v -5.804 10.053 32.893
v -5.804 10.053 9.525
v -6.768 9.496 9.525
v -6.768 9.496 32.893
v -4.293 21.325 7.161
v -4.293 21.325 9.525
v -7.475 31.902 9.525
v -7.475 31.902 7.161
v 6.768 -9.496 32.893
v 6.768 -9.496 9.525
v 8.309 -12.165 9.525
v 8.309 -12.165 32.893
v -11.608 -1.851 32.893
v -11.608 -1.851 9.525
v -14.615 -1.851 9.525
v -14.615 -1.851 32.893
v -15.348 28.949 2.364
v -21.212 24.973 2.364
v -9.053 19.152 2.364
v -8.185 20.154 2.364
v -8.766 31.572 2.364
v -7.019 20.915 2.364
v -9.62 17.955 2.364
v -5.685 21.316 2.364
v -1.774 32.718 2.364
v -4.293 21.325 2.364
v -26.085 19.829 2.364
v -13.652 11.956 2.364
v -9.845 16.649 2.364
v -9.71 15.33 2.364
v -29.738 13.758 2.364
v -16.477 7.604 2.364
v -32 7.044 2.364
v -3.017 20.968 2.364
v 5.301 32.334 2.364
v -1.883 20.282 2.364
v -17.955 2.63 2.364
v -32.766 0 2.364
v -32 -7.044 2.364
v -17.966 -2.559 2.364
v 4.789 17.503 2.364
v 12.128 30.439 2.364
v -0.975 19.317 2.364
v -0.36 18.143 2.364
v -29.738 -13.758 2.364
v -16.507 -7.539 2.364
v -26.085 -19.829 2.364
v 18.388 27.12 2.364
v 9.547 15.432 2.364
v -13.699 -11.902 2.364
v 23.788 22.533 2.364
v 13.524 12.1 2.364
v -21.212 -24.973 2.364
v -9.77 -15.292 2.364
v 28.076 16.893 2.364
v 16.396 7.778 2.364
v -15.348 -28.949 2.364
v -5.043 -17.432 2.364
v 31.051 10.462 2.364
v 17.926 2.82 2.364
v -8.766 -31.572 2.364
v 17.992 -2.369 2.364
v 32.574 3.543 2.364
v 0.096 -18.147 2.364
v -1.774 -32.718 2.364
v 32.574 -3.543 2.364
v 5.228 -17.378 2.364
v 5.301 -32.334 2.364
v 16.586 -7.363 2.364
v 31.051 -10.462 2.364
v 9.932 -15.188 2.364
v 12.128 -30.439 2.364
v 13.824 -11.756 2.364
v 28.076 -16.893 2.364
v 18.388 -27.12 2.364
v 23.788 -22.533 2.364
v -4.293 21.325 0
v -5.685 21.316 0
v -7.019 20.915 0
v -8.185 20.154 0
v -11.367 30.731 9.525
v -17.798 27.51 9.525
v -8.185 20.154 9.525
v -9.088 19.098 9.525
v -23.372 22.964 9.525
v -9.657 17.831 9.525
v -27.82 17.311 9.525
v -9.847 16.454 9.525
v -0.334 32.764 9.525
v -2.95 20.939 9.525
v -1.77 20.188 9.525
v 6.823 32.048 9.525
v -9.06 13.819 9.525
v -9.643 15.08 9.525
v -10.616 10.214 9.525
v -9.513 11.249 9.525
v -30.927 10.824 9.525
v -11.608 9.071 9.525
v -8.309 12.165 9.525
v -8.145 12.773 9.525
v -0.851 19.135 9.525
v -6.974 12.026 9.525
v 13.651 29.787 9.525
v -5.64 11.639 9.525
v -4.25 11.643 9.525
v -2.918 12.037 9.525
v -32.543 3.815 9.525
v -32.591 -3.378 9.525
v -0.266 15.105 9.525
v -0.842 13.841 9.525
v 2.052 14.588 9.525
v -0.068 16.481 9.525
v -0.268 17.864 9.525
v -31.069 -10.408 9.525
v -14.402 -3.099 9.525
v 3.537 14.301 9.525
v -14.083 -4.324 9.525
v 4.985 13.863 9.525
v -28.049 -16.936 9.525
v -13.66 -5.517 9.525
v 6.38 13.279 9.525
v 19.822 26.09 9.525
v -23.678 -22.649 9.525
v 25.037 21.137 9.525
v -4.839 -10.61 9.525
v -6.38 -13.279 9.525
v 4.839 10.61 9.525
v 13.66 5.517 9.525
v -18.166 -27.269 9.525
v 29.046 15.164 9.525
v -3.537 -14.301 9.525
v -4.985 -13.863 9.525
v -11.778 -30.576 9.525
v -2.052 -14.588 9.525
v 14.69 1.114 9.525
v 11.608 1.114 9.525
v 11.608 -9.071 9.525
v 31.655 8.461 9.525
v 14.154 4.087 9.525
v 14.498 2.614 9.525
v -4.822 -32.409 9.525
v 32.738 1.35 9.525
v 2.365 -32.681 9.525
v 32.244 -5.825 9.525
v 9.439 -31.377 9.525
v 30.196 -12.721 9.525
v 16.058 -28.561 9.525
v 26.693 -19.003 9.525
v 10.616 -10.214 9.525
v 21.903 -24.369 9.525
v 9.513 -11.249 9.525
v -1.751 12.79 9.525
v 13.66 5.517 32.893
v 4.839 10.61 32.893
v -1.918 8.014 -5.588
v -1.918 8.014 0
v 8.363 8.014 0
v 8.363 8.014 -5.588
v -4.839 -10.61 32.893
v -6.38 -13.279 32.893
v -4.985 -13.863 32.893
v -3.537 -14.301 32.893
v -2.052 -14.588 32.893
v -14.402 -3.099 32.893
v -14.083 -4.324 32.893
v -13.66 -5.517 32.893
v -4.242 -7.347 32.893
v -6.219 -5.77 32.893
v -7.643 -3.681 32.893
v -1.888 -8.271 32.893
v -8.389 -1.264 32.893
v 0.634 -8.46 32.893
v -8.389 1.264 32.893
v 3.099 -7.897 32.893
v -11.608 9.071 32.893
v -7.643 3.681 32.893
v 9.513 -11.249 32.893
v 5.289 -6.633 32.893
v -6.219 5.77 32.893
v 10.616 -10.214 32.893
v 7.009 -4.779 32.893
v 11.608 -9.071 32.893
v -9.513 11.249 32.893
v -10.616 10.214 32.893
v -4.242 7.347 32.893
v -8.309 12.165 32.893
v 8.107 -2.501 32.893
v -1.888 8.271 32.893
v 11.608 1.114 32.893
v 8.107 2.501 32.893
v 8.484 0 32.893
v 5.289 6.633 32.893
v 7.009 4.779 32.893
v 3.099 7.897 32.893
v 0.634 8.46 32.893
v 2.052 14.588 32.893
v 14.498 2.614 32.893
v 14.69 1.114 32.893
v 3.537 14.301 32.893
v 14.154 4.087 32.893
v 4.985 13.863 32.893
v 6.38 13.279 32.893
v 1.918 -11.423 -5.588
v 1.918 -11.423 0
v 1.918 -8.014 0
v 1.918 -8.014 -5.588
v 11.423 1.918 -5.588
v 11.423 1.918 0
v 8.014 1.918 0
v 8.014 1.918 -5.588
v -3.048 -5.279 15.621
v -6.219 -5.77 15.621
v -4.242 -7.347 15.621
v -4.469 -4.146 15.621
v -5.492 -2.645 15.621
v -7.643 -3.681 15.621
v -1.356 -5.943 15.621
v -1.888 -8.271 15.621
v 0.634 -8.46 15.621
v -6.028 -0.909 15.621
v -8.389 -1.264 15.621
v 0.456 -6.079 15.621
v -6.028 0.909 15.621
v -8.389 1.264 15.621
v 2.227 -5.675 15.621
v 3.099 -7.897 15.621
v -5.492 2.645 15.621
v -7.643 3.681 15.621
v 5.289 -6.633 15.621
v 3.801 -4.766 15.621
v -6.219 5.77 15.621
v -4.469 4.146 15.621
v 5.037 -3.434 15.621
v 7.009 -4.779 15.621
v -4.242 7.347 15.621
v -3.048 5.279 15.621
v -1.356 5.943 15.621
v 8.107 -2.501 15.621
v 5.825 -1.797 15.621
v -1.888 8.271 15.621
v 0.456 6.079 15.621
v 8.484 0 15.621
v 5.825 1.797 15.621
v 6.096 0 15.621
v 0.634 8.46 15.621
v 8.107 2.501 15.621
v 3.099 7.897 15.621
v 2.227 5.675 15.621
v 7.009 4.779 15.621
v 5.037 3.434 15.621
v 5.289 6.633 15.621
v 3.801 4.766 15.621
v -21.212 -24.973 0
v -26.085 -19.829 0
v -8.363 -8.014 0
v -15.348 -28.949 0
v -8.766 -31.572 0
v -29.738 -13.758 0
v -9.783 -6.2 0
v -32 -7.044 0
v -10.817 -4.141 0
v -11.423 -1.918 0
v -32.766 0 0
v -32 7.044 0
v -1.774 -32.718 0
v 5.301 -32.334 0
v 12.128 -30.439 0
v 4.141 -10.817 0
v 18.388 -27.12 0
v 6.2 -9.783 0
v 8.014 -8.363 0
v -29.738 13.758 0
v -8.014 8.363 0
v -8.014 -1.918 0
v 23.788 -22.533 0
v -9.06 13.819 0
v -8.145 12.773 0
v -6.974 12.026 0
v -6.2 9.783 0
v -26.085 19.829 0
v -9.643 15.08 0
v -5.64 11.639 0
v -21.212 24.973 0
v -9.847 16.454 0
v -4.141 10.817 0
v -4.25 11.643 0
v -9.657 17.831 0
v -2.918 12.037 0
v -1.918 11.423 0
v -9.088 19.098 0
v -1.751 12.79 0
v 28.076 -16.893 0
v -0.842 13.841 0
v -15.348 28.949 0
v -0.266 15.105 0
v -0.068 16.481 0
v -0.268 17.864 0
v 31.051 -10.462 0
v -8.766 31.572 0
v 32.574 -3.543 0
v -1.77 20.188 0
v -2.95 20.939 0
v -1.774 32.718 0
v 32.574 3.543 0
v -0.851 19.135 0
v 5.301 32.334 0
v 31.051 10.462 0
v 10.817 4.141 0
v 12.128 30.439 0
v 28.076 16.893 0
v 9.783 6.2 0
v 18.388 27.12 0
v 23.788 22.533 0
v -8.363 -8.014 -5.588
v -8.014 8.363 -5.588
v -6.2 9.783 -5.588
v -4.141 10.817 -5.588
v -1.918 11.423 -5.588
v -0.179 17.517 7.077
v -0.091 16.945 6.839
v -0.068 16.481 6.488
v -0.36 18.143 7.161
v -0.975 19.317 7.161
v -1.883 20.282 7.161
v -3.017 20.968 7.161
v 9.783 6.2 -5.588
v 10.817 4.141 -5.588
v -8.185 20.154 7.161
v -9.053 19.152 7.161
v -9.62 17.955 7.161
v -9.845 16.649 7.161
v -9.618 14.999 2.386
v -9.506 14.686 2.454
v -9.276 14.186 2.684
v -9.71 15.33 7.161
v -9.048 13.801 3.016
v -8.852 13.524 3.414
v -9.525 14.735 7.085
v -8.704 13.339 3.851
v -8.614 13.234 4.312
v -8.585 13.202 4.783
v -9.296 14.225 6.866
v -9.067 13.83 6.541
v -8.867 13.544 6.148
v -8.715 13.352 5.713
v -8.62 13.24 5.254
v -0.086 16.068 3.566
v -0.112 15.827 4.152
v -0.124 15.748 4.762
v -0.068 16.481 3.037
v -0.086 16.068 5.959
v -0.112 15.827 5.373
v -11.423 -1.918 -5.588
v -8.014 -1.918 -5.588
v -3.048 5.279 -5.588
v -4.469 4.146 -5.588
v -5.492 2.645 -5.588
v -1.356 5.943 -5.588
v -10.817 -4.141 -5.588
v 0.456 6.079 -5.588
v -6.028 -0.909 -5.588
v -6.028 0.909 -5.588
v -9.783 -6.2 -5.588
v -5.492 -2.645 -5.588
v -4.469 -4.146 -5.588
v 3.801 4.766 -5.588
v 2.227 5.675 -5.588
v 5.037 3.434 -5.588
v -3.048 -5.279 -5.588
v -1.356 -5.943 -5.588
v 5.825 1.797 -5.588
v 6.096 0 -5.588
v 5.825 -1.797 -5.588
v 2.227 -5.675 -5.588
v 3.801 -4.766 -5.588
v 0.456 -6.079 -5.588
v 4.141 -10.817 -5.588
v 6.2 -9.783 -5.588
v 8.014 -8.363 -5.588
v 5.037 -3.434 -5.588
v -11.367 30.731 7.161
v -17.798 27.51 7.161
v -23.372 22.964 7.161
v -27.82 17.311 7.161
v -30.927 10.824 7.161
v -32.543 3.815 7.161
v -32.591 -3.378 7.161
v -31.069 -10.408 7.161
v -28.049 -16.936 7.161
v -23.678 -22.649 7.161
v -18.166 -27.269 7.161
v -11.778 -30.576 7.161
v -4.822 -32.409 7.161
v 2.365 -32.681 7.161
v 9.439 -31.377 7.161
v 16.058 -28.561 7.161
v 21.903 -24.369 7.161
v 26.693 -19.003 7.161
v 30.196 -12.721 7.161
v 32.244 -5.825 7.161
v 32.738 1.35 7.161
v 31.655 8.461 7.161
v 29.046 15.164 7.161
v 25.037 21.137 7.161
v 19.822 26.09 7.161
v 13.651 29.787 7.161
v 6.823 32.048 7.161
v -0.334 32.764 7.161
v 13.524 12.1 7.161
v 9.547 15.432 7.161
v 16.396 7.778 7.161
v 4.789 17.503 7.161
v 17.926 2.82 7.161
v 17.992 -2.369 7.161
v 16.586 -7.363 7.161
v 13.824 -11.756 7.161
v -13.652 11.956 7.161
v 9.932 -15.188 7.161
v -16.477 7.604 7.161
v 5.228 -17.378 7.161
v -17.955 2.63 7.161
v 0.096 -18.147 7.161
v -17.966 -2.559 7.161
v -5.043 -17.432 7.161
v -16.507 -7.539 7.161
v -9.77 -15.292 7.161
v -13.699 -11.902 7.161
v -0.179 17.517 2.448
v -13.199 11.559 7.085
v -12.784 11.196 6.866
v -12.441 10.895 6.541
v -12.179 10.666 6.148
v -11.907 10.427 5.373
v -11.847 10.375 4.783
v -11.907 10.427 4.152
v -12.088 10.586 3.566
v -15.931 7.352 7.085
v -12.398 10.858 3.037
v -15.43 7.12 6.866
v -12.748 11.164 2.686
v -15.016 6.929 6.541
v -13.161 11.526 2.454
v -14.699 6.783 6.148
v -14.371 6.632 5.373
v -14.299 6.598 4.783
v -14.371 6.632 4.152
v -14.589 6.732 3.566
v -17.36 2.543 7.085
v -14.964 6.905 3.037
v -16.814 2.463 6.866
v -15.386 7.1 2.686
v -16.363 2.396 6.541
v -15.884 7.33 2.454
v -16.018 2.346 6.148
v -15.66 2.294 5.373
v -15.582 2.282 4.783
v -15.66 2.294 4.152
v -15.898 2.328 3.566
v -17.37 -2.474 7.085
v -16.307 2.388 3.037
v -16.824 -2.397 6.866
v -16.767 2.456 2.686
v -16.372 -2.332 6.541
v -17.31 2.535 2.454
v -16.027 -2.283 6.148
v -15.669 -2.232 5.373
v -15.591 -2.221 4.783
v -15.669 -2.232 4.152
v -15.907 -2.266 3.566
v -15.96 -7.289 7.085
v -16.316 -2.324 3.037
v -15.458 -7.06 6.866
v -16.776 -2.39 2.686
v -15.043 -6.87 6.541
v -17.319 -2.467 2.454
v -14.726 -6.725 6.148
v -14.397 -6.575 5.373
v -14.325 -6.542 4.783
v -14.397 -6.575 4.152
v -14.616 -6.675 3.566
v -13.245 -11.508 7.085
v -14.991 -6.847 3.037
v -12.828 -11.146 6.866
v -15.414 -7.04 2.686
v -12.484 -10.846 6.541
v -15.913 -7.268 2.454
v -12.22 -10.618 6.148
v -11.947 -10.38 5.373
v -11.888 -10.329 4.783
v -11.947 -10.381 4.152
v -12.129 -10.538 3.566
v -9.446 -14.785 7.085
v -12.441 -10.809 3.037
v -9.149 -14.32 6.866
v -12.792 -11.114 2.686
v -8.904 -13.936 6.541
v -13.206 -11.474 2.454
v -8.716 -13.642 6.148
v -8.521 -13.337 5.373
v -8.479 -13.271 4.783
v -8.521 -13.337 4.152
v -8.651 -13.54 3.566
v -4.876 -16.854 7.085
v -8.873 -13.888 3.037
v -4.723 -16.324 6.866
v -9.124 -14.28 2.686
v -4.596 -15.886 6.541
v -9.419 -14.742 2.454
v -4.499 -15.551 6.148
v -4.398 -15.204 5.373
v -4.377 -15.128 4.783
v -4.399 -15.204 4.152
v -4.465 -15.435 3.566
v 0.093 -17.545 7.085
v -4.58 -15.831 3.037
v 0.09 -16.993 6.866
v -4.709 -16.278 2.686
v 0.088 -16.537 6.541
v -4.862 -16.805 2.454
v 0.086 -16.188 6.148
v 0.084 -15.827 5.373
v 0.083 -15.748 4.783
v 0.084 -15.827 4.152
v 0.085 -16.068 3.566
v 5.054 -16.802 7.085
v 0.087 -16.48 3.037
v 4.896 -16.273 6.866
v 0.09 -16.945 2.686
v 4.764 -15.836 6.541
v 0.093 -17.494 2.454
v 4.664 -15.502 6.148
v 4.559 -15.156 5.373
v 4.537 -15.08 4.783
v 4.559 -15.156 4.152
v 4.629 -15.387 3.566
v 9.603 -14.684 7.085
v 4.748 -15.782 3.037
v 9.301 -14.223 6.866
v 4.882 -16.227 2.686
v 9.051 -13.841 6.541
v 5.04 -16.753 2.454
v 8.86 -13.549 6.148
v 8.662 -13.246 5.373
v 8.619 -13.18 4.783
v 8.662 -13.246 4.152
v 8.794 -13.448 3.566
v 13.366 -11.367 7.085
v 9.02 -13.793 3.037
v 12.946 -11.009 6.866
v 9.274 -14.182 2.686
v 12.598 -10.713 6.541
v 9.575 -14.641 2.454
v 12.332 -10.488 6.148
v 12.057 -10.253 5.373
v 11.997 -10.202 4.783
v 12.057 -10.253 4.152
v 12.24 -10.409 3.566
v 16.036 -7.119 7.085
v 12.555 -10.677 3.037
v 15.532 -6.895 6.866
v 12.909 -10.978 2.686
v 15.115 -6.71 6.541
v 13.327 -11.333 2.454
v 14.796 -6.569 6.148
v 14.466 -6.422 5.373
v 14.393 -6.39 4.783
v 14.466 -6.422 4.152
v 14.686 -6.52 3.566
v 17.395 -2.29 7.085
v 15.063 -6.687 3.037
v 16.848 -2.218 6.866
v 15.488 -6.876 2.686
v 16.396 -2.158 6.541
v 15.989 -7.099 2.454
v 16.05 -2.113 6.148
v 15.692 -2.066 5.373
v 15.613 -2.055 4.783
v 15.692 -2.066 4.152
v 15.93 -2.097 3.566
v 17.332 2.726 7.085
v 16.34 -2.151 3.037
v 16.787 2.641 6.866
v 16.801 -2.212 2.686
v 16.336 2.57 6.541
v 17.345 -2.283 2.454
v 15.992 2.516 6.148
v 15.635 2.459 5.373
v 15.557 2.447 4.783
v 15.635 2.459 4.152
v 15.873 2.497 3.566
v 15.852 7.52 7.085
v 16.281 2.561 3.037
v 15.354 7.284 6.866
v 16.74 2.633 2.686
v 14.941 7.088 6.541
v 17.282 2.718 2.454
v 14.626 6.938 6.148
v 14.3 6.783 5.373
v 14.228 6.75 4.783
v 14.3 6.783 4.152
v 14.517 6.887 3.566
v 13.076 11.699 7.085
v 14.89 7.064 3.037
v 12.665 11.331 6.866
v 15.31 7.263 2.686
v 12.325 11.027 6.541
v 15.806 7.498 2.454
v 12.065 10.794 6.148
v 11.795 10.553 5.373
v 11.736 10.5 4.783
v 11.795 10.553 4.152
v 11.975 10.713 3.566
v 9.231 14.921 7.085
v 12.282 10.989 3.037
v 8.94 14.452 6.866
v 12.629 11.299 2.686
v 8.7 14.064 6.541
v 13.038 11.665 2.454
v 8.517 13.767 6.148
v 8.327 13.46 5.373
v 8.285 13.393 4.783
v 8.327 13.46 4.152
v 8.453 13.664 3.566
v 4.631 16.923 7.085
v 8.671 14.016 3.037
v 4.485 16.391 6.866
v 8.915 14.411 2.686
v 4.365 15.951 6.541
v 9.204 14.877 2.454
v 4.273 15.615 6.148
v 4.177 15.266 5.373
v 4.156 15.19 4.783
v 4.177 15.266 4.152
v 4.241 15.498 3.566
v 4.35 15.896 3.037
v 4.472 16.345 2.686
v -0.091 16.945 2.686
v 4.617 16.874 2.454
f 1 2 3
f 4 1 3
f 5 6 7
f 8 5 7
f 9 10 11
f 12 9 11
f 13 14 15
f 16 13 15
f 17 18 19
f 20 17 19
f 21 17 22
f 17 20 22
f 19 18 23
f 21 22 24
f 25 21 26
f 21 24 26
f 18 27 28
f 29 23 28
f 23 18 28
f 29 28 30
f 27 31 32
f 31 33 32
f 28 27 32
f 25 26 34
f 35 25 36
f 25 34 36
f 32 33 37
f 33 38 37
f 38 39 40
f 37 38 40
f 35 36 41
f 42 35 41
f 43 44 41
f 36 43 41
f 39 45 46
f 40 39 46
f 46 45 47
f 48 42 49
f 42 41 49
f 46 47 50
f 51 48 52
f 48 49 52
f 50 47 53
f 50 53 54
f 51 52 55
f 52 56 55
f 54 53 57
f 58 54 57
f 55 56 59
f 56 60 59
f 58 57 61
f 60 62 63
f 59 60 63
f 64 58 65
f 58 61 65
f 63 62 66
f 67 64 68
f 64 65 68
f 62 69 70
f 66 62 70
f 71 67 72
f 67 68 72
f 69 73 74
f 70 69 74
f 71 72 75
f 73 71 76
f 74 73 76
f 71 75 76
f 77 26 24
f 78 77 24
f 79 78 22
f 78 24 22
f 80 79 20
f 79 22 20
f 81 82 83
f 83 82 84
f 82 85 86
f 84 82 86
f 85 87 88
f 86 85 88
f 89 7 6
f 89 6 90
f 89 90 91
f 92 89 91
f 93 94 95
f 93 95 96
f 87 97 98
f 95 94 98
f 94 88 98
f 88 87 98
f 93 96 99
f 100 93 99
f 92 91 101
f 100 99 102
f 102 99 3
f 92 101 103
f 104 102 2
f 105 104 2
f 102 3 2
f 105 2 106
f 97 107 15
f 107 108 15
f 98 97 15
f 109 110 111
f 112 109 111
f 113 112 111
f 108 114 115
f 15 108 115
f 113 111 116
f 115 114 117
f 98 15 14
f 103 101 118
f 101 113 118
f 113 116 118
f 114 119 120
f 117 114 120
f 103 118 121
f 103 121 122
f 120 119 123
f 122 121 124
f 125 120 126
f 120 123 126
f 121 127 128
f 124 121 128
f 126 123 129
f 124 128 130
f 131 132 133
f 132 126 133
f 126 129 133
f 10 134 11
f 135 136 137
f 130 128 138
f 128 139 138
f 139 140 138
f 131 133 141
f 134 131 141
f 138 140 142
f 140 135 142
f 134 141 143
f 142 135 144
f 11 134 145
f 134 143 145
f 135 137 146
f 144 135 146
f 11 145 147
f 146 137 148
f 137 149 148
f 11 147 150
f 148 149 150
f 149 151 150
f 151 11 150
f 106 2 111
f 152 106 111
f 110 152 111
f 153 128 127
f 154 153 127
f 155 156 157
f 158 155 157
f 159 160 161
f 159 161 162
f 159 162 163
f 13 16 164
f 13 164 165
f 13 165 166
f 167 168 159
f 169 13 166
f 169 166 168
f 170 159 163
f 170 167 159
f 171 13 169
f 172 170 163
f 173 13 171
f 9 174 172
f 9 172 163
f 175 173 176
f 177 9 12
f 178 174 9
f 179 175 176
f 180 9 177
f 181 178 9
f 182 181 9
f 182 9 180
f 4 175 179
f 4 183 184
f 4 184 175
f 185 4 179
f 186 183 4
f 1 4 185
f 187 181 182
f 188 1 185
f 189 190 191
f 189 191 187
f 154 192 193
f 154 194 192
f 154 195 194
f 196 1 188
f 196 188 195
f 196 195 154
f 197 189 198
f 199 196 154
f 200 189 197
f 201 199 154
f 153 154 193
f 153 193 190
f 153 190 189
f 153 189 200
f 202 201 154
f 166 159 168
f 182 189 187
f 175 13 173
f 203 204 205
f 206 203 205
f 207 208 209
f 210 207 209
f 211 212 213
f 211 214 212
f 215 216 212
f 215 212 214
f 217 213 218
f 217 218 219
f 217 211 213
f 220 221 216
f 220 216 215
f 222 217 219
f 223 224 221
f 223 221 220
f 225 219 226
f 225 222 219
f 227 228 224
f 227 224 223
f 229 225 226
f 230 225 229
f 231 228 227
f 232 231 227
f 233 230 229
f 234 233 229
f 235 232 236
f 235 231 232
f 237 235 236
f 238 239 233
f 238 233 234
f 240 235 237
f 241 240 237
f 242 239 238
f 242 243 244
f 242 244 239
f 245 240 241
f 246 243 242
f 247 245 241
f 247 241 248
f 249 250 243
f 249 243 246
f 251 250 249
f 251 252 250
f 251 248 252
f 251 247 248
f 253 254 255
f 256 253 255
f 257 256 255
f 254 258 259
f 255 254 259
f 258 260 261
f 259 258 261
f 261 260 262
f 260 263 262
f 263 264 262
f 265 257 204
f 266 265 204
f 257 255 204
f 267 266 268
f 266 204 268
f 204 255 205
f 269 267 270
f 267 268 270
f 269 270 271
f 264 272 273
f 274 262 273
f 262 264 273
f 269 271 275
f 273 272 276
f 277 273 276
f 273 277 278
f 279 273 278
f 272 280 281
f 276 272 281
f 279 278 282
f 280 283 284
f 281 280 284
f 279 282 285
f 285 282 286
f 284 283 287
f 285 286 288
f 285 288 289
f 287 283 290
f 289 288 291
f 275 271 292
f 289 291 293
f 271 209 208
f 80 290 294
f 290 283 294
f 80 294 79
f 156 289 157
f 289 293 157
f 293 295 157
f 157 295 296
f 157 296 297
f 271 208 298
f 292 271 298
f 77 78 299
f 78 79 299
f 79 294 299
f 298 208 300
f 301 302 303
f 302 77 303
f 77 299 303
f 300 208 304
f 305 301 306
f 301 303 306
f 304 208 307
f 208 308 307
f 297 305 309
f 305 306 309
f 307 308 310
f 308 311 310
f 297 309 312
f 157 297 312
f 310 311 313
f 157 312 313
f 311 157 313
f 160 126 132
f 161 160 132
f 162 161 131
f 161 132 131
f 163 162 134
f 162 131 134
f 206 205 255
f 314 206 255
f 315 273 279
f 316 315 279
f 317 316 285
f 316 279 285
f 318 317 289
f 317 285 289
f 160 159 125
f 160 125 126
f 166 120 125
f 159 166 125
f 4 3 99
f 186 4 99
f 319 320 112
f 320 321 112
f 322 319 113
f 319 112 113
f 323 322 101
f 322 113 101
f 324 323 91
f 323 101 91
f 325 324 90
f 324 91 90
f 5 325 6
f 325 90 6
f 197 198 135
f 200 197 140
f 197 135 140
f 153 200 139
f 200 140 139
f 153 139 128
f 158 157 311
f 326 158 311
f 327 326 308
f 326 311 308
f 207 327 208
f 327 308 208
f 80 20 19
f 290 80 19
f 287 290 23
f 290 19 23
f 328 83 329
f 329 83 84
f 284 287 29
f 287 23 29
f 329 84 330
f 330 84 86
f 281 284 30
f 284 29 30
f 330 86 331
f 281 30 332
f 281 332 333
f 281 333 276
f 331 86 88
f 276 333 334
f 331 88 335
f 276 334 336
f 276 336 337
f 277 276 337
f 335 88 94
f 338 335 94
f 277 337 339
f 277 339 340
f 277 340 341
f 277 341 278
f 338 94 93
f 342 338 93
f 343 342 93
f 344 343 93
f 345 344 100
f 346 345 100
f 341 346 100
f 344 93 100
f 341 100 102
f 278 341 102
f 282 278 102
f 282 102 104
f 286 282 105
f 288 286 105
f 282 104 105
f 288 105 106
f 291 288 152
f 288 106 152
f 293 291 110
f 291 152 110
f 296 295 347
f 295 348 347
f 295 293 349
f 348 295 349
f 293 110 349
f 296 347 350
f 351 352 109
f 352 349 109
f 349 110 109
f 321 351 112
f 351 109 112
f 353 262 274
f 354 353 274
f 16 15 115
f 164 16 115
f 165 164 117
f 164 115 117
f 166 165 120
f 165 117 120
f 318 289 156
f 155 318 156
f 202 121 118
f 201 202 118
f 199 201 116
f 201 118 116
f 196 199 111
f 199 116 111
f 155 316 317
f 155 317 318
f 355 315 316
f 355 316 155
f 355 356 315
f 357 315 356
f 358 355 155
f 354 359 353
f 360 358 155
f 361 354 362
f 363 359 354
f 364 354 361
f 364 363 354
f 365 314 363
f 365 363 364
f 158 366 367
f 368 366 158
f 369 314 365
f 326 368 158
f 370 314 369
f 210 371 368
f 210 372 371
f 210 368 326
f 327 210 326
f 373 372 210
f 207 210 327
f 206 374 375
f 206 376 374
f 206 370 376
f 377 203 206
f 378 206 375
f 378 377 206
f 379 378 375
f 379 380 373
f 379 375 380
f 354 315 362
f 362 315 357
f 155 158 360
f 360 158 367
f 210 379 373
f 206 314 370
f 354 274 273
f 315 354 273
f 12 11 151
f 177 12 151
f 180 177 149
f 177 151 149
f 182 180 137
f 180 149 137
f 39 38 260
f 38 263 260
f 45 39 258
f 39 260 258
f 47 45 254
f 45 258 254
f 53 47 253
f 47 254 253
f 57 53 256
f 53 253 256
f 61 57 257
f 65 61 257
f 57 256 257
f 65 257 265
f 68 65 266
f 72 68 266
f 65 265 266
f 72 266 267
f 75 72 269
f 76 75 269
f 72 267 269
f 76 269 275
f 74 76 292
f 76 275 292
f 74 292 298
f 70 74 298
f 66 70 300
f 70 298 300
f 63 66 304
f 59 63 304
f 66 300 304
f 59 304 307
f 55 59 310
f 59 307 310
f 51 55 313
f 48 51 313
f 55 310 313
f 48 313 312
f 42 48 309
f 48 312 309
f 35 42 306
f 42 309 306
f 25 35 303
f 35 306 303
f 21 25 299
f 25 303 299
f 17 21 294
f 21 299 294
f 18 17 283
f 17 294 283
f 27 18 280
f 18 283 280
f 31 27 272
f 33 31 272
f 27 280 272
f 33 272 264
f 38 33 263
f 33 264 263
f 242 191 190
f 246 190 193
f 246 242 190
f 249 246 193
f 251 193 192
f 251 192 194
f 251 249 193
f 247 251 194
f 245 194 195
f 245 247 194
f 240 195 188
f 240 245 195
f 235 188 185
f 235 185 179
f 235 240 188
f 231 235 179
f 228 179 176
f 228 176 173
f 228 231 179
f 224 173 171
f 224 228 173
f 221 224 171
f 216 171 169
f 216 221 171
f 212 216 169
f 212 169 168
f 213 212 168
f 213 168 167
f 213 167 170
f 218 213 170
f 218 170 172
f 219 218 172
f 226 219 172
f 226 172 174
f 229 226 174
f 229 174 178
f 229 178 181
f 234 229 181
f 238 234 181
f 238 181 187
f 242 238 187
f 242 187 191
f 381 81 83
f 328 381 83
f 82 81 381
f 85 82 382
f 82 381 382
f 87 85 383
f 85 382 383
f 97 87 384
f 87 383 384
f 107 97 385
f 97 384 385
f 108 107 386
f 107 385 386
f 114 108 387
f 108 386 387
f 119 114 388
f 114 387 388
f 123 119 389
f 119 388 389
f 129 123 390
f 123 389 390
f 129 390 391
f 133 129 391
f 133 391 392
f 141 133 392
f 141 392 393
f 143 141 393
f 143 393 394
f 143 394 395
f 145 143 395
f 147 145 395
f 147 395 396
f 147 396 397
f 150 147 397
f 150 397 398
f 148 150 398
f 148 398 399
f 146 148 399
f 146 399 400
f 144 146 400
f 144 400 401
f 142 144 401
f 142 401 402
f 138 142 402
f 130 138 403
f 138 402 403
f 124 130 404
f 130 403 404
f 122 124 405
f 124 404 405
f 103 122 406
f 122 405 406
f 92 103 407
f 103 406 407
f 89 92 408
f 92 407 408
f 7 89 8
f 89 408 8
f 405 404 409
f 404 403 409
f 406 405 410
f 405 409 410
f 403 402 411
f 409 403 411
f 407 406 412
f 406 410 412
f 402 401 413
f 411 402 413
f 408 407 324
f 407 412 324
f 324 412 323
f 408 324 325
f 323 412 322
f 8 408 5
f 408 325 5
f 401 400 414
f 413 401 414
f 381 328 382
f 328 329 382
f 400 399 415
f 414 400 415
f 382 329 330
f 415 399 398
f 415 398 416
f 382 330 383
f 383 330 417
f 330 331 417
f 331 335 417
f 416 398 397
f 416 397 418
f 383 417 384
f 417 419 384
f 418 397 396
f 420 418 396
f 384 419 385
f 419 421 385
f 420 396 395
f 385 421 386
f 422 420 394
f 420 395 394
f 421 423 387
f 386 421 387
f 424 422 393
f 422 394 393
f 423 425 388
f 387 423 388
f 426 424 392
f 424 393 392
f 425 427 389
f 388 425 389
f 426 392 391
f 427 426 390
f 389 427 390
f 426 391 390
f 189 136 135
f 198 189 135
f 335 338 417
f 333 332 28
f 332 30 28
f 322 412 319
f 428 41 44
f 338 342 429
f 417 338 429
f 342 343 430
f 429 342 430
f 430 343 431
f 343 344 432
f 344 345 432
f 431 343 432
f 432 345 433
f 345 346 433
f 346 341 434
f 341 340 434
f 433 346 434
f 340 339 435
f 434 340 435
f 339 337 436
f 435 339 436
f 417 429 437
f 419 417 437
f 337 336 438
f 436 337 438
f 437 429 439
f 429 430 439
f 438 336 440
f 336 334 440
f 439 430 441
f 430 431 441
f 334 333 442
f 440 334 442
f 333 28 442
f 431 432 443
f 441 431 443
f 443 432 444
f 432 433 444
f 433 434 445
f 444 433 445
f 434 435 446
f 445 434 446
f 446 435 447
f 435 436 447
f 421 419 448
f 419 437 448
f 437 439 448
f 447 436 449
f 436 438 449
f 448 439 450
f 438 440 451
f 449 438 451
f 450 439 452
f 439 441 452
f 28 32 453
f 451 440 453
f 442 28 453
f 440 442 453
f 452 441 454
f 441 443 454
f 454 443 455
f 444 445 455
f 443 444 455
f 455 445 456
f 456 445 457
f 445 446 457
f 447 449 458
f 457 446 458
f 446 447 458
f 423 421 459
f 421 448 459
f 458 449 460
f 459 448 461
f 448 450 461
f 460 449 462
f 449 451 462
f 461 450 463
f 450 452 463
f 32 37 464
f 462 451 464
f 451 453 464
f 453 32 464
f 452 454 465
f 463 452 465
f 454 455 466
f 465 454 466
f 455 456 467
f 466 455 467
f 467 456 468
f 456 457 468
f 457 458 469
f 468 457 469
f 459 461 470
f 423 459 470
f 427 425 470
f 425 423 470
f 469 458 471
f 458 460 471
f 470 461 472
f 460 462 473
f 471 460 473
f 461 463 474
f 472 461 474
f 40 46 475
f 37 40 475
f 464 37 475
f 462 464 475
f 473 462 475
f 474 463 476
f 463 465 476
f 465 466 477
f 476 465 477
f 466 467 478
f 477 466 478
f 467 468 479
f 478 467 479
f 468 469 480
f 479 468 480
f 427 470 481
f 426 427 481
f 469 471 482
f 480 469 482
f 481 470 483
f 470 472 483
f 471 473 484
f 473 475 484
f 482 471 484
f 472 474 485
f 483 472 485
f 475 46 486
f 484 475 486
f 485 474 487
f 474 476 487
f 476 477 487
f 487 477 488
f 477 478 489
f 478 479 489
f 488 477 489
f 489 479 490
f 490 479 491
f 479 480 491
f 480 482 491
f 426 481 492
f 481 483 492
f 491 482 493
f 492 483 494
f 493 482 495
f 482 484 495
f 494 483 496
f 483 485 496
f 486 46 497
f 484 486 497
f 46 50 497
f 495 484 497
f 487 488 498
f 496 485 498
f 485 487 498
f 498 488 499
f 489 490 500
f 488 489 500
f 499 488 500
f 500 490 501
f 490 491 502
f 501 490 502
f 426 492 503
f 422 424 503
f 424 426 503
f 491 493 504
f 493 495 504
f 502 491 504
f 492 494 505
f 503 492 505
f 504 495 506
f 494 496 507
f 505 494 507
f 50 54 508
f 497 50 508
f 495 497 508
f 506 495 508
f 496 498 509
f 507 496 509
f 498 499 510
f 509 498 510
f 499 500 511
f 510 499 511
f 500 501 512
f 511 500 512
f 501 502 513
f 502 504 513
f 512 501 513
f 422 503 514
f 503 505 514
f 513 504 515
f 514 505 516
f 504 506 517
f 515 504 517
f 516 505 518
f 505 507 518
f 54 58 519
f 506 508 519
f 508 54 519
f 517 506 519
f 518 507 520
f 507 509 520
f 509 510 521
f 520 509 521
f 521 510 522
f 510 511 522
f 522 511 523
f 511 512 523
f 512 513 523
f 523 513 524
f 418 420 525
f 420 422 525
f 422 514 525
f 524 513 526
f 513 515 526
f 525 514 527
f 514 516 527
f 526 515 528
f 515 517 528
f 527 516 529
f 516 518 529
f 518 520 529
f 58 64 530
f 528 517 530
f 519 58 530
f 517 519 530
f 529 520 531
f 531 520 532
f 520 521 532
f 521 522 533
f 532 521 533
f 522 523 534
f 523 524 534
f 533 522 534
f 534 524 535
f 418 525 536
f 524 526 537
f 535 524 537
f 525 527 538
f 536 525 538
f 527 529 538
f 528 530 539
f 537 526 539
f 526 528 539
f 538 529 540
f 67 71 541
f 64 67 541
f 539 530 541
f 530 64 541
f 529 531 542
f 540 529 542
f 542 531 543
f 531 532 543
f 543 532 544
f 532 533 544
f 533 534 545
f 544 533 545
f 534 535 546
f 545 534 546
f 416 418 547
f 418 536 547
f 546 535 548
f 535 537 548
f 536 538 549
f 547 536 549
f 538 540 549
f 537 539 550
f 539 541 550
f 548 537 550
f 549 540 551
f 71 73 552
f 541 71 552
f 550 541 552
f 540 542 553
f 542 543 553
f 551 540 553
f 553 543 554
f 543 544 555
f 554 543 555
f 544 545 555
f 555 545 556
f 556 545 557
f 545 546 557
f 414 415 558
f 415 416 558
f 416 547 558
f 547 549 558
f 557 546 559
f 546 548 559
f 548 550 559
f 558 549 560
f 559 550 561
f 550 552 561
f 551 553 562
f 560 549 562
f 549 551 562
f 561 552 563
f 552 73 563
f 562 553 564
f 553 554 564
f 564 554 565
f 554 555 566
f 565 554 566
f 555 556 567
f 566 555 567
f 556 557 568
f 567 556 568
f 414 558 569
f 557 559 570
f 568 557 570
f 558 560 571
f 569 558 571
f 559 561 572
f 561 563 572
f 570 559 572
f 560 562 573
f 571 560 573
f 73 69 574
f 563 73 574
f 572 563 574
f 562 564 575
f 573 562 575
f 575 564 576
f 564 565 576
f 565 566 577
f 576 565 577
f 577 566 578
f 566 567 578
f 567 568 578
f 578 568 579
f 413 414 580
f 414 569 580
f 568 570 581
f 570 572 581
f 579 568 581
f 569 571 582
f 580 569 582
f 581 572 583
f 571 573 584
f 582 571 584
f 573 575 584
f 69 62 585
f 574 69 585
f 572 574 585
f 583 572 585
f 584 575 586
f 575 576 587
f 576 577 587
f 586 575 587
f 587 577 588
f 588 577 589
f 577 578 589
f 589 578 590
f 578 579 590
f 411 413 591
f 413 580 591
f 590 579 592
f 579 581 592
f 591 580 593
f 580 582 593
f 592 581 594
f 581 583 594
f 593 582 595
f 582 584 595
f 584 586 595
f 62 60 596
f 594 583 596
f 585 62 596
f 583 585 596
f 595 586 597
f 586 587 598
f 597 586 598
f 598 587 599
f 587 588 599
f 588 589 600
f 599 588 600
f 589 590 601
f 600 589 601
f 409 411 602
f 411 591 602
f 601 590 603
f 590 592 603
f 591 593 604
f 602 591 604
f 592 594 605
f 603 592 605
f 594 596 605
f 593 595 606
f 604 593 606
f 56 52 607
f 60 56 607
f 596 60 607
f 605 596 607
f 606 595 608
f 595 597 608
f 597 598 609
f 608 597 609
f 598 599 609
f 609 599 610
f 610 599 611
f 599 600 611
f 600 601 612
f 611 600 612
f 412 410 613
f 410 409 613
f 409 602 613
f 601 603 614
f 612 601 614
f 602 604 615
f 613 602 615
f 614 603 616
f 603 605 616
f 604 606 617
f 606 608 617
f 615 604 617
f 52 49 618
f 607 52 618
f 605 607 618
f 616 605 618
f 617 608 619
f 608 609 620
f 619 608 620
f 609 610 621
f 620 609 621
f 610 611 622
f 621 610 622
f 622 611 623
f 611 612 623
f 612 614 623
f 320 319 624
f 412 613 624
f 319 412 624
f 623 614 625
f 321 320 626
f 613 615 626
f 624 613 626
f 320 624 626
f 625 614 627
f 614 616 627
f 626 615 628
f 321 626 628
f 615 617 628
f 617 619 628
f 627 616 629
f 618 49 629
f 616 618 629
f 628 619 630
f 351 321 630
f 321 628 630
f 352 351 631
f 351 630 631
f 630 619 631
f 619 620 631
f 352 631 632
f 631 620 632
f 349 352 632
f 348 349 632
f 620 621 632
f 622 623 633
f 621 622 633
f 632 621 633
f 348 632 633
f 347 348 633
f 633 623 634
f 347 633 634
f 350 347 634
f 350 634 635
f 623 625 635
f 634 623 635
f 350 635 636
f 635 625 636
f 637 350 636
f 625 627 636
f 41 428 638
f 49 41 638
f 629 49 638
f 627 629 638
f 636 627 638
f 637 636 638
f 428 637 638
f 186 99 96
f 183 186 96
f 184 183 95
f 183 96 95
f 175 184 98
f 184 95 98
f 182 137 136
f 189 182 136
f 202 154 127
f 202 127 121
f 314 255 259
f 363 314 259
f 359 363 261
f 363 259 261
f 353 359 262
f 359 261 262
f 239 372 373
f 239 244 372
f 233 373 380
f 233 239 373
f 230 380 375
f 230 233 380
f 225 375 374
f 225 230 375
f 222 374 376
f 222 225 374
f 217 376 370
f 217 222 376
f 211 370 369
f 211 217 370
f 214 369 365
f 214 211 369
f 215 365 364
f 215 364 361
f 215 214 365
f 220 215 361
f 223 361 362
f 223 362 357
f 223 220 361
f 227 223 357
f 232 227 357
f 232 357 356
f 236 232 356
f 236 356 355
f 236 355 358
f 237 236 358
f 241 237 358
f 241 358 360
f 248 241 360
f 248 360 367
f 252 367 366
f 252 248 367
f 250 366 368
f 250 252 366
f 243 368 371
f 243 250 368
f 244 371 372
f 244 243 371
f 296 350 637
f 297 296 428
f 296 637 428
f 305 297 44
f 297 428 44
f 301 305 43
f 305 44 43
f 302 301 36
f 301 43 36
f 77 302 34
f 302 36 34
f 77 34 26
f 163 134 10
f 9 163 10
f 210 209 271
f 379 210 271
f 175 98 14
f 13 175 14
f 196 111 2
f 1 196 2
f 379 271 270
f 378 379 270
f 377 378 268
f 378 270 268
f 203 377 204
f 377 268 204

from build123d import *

# Parameters (mm, degrees)
F2_R      = 8.4836
F3_DEPTH  = 32.893
F2_R_2    = 6.096
F4_DEPTH  = 15.621
F5_DEPTH  = 25.4
F6_R      = 6.096
F7_DEPTH  = 5.588
F9_DEPTH  = 25.4
F10_DEPTH = 4.064


with BuildPart() as f1:
    # F0 (on Front) → F1 (revolve)
    with BuildSketch(Plane.XZ):
        with BuildLine():
            Line((-32.766, 0), (0, 0))
            Line((0, 0), (0, 9.525))
            Line((0, 9.525), (-32.766, 9.525))
            Line((-32.766, 9.525), (-32.766, 7.1613881737))
            Line((-32.766, 7.1613881737), (-18.1468881737, 7.1613881737))
            ThreePointArc((-18.1468881737, 7.1613881737), (-15.748, 4.7625), (-18.1468881737, 2.3636118263))
            Line((-18.1468881737, 2.3636118263), (-32.766, 2.3636118263))
            Line((-32.766, 2.3636118263), (-32.766, 0))
        make_face()
    revolve(axis=Axis((0, 0, 13.9041366056), (0, 0, 1)))

    # F2 (on Top) → F3 (join)
    with BuildSketch(Plane.XY):
        with BuildLine():
            Line((-11.6078, -1.8505721543), (-14.6153072736, -1.8505721543))
            ThreePointArc((-14.6153072736, -1.8505721543), (-14.2560030009, -3.7145931726), (-13.659986963, -5.5169357592))
            Line((-13.659986963, -5.5169357592), (-4.8393499563, -10.6095329094))
            Line((-4.8393499563, -10.6095329094), (-6.3803690894, -13.2786563433))
            ThreePointArc((-6.3803690894, -13.2786563433), (-4.2668294637, -14.1005670215), (-2.052186963, -14.5883636049))
            Line((-2.052186963, -14.5883636049), (6.7684500437, -9.4957664547))
            Line((6.7684500437, -9.4957664547), (8.3094691767, -12.1648898886))
            ThreePointArc((8.3094691767, -12.1648898886), (10.0780345166, -10.7454662199), (11.6078, -9.0714278457))
            Line((11.6078, -9.0714278457), (11.6078, 1.1137664547))
            Line((11.6078, 1.1137664547), (14.6898382661, 1.1137664547))
            ThreePointArc((14.6898382661, 1.1137664547), (14.3448639802, 3.3551008016), (13.659986963, 5.5169357592))
            Line((13.659986963, 5.5169357592), (4.8393499563, 10.6095329094))
            Line((4.8393499563, 10.6095329094), (6.3803690894, 13.2786563433))
            ThreePointArc((6.3803690894, 13.2786563433), (4.2668294637, 14.1005670215), (2.052186963, 14.5883636049))
            Line((2.052186963, 14.5883636049), (-5.8039, 10.052649682))
            Line((-5.8039, 10.052649682), (-6.7684500437, 9.4957664547))
            Line((-6.7684500437, 9.4957664547), (-8.3094691767, 12.1648898886))
            ThreePointArc((-8.3094691767, 12.1648898886), (-10.0780345166, 10.7454662199), (-11.6078, 9.0714278457))
            Line((-11.6078, 9.0714278457), (-11.6078, 0))
            Line((-11.6078, 0), (-11.6078, -1.8505721543))
        make_face()
        Circle(F2_R, mode=Mode.SUBTRACT)
    extrude(amount=F3_DEPTH)

    # F2 (on Top) → F4 (join)
    with BuildSketch(Plane.XY):
        Circle(F2_R)
        Circle(F2_R_2, mode=Mode.SUBTRACT)
    extrude(amount=F4_DEPTH)

    # F2 (on Top) → F5 (cut)
    with BuildSketch(Plane.XY):
        Circle(F2_R_2)
    extrude(amount=F5_DEPTH, mode=Mode.SUBTRACT)

    # F6 (on face) → F7 (join)
    with BuildSketch(Plane(origin=(0, 0, 0), x_dir=(1, 0, 0), z_dir=(0, 0, -1))):
        with BuildLine():
            Line((-8.0137, 1.9177), (-8.0137, -8.3625714986))
            ThreePointArc((-8.0137, -8.3625714986), (-5.1960588966, -10.3514714752), (-1.9177, -11.4225398432))
            Line((-1.9177, -11.4225398432), (-1.9177, -8.0137))
            Line((-1.9177, -8.0137), (8.3625714986, -8.0137))
            ThreePointArc((8.3625714986, -8.0137), (10.3514714752, -5.1960588966), (11.4225398432, -1.9177))
            Line((11.4225398432, -1.9177), (8.0137, -1.9177))
            Line((8.0137, -1.9177), (8.0137, 8.3625714986))
            ThreePointArc((8.0137, 8.3625714986), (5.1960588966, 10.3514714752), (1.9177, 11.4225398432))
            Line((1.9177, 11.4225398432), (1.9177, 8.0137))
            Line((1.9177, 8.0137), (-8.3625714986, 8.0137))
            ThreePointArc((-8.3625714986, 8.0137), (-10.3514714752, 5.1960588966), (-11.4225398432, 1.9177))
            Line((-11.4225398432, 1.9177), (-8.0137, 1.9177))
        make_face()
        Circle(F6_R, mode=Mode.SUBTRACT)
    extrude(amount=F7_DEPTH)

    # F8 (on face) → F9 (cut)
    with BuildSketch(Plane.XY.offset(9.525)):
        with BuildLine():
            ThreePointArc((-8.1849360794, 20.1539266654), (-6.9739301336, 12.0260401102), (-0.0684106271, 16.4805743843))
            ThreePointArc((-0.0684106271, 16.4805743843), (-1.2729957626, 19.6943902925), (-4.293224081, 21.3246844208))
            ThreePointArc((-4.293224081, 21.3246844208), (-6.3664785516, 21.1627903823), (-8.1849360794, 20.1539266654))
        make_face()
    extrude(amount=-F9_DEPTH, mode=Mode.SUBTRACT)

    # F8 (on face) → F10 (cut)
    with BuildSketch(Plane.XY.offset(9.525)):
        with BuildLine():
            ThreePointArc((-8.1849360794, 20.1539266654), (-6.3664785516, 21.1627903823), (-4.293224081, 21.3246844208))
            Line((-4.293224081, 21.3246844208), (-7.4752096352, 31.90191212))
            ThreePointArc((-7.4752096352, 31.90191212), (-9.4392344031, 31.3769279867), (-11.3669216335, 30.7311543645))
            Line((-11.3669216335, 30.7311543645), (-8.1849360794, 20.1539266654))
        make_face()
    extrude(amount=-F10_DEPTH, mode=Mode.SUBTRACT)


solid = f1.part
